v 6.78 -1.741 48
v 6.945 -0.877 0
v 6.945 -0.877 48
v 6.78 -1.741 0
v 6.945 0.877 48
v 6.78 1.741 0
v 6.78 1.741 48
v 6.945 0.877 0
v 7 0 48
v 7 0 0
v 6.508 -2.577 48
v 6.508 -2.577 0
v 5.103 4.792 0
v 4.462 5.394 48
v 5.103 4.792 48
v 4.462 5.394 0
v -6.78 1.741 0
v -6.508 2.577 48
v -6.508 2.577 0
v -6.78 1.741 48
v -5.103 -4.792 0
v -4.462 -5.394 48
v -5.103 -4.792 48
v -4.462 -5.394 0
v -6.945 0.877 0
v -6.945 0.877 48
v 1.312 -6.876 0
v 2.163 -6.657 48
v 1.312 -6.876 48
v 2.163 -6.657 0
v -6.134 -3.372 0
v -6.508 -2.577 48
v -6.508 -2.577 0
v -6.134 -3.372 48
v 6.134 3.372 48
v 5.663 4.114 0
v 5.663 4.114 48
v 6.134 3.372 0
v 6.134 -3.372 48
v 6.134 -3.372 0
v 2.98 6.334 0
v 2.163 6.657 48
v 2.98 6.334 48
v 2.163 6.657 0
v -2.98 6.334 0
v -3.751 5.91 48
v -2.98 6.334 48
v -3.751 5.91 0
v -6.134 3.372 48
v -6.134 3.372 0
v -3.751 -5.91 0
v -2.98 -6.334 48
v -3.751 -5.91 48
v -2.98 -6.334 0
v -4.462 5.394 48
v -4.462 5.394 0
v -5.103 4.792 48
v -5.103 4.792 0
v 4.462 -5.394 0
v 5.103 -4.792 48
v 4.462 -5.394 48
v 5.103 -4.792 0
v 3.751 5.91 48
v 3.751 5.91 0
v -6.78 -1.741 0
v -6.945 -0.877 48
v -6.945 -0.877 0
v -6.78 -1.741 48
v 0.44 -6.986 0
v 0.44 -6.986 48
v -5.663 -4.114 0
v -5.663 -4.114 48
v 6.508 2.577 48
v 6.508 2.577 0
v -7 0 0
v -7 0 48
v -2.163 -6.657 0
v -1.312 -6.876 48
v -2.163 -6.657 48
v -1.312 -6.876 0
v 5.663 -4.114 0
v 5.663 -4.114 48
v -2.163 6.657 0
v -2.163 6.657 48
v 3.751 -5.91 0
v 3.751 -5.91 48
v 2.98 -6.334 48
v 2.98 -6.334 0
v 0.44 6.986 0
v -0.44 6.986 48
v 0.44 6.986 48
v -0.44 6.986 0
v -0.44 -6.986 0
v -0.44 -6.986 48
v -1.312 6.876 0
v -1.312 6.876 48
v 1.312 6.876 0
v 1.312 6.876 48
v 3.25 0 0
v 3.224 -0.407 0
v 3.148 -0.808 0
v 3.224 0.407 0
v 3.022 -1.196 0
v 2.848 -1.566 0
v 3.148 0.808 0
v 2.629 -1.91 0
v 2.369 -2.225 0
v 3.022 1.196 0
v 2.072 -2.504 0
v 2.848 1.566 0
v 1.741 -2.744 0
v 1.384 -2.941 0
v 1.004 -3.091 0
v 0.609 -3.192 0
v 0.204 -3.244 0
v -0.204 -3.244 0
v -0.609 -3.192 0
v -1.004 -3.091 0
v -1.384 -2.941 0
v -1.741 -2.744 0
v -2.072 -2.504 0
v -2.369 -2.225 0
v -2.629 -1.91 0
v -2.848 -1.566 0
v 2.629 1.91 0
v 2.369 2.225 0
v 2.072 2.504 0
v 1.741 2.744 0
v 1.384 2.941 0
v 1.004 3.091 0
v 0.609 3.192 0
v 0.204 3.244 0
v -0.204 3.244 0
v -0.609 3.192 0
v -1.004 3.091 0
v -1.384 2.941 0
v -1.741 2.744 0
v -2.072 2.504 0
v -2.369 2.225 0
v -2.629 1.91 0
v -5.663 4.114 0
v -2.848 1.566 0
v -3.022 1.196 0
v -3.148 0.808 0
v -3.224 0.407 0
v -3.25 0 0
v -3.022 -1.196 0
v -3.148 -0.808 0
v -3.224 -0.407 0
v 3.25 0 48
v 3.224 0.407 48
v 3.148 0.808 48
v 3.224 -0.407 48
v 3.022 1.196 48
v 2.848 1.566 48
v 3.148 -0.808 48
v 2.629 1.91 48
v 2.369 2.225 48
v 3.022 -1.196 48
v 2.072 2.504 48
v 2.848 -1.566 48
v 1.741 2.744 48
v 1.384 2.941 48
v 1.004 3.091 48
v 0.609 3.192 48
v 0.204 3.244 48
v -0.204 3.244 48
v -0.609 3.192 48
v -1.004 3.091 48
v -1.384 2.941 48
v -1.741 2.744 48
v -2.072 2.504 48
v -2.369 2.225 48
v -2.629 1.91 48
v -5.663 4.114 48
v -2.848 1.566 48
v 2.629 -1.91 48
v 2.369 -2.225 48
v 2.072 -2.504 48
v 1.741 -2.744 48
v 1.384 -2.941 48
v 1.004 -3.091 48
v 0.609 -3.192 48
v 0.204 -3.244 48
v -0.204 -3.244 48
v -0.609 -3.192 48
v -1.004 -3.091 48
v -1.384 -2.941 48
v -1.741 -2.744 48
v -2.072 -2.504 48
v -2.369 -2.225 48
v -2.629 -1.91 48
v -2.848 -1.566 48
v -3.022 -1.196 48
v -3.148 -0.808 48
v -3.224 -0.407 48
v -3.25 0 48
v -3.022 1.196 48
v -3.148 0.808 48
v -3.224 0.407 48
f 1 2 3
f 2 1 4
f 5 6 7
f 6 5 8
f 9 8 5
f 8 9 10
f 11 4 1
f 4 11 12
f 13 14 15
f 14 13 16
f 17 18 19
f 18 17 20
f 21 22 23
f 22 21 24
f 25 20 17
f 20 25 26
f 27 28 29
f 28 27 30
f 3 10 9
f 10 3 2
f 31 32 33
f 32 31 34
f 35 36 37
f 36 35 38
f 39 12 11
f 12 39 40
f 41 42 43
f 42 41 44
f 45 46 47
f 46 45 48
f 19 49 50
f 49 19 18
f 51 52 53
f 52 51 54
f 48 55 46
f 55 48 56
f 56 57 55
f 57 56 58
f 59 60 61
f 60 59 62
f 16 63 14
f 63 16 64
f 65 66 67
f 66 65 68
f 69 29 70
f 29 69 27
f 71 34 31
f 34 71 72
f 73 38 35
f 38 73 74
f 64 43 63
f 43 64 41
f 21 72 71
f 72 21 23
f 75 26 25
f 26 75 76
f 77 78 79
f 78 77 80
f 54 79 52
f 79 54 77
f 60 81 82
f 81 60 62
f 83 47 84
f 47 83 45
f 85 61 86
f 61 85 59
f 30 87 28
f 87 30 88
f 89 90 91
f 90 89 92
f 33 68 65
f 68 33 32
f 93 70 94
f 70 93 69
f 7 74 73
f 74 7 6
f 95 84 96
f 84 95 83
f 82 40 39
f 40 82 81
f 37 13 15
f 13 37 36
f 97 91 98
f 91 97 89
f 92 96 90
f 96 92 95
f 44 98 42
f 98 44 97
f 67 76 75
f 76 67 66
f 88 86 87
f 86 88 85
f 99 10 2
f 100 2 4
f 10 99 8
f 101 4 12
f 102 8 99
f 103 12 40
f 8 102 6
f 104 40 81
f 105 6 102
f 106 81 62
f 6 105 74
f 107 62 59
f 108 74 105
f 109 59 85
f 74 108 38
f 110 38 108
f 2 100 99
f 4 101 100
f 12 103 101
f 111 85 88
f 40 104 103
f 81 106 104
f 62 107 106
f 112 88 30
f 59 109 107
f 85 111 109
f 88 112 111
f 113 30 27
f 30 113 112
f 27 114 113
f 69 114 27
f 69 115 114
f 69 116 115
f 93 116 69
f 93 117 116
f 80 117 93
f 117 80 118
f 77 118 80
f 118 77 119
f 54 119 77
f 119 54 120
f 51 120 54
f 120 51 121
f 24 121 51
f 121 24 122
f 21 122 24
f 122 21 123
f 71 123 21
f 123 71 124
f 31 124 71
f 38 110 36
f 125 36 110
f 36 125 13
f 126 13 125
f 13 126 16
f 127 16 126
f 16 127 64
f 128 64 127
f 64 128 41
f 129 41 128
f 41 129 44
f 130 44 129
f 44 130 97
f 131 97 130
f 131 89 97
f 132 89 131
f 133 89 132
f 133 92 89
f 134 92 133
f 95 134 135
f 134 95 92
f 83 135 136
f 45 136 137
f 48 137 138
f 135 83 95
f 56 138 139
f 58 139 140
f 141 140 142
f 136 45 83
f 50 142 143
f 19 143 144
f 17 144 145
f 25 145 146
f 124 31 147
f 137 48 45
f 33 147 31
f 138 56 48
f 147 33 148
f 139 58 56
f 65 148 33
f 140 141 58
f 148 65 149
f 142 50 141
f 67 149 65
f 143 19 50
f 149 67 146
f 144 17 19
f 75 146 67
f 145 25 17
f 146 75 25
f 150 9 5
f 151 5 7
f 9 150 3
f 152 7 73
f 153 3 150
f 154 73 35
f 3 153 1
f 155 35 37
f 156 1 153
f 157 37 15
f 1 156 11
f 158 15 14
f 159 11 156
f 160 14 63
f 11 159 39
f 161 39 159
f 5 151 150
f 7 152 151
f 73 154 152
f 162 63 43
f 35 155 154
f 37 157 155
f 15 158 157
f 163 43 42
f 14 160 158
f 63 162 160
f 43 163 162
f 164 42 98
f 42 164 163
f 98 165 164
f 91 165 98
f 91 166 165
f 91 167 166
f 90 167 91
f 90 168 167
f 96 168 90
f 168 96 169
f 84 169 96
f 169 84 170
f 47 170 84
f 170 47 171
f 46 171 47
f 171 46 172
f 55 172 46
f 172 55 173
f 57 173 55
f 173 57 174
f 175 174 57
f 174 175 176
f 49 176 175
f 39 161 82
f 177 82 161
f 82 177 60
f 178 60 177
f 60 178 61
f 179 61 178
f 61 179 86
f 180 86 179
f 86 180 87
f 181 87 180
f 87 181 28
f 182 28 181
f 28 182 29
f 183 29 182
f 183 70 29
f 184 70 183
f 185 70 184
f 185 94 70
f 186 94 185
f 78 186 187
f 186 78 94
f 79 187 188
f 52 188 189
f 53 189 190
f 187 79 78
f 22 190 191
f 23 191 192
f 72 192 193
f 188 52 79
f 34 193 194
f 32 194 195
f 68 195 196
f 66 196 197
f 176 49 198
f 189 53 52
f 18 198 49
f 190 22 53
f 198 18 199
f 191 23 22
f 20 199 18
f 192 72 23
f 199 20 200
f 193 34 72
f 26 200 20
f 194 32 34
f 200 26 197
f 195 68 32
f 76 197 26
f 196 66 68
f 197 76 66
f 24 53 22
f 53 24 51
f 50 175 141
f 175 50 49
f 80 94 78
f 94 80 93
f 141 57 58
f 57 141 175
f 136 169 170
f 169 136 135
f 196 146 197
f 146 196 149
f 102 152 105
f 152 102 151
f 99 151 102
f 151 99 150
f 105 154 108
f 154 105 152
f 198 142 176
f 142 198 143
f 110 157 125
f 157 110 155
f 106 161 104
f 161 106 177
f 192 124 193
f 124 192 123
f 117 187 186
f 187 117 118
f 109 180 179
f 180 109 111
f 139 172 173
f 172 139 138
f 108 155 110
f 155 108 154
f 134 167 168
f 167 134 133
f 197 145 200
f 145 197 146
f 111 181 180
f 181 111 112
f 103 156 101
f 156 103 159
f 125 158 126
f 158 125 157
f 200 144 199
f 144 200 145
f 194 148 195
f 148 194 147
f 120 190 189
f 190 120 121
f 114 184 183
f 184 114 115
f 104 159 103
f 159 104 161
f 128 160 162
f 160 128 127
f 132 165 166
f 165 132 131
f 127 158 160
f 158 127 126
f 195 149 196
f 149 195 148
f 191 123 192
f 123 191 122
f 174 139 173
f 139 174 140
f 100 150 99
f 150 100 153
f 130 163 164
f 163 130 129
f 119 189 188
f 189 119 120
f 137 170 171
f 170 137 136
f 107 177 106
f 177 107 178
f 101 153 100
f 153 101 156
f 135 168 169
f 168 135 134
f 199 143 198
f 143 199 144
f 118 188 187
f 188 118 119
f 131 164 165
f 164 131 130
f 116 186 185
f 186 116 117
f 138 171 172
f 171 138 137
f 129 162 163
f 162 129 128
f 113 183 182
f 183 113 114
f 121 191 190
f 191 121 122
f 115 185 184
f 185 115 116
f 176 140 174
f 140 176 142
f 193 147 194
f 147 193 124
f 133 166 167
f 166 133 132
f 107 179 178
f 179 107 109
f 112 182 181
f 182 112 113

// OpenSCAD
$fn = 50;


difference() {
	union() {
		cylinder(h = 48, r = 7.0000000000);
	}
	union() {
		translate(v = [0.0000000000, 0.0000000000, -100.0000000000]) {
			cylinder(h = 200, r = 3.2500000000);
		}
	}
}
